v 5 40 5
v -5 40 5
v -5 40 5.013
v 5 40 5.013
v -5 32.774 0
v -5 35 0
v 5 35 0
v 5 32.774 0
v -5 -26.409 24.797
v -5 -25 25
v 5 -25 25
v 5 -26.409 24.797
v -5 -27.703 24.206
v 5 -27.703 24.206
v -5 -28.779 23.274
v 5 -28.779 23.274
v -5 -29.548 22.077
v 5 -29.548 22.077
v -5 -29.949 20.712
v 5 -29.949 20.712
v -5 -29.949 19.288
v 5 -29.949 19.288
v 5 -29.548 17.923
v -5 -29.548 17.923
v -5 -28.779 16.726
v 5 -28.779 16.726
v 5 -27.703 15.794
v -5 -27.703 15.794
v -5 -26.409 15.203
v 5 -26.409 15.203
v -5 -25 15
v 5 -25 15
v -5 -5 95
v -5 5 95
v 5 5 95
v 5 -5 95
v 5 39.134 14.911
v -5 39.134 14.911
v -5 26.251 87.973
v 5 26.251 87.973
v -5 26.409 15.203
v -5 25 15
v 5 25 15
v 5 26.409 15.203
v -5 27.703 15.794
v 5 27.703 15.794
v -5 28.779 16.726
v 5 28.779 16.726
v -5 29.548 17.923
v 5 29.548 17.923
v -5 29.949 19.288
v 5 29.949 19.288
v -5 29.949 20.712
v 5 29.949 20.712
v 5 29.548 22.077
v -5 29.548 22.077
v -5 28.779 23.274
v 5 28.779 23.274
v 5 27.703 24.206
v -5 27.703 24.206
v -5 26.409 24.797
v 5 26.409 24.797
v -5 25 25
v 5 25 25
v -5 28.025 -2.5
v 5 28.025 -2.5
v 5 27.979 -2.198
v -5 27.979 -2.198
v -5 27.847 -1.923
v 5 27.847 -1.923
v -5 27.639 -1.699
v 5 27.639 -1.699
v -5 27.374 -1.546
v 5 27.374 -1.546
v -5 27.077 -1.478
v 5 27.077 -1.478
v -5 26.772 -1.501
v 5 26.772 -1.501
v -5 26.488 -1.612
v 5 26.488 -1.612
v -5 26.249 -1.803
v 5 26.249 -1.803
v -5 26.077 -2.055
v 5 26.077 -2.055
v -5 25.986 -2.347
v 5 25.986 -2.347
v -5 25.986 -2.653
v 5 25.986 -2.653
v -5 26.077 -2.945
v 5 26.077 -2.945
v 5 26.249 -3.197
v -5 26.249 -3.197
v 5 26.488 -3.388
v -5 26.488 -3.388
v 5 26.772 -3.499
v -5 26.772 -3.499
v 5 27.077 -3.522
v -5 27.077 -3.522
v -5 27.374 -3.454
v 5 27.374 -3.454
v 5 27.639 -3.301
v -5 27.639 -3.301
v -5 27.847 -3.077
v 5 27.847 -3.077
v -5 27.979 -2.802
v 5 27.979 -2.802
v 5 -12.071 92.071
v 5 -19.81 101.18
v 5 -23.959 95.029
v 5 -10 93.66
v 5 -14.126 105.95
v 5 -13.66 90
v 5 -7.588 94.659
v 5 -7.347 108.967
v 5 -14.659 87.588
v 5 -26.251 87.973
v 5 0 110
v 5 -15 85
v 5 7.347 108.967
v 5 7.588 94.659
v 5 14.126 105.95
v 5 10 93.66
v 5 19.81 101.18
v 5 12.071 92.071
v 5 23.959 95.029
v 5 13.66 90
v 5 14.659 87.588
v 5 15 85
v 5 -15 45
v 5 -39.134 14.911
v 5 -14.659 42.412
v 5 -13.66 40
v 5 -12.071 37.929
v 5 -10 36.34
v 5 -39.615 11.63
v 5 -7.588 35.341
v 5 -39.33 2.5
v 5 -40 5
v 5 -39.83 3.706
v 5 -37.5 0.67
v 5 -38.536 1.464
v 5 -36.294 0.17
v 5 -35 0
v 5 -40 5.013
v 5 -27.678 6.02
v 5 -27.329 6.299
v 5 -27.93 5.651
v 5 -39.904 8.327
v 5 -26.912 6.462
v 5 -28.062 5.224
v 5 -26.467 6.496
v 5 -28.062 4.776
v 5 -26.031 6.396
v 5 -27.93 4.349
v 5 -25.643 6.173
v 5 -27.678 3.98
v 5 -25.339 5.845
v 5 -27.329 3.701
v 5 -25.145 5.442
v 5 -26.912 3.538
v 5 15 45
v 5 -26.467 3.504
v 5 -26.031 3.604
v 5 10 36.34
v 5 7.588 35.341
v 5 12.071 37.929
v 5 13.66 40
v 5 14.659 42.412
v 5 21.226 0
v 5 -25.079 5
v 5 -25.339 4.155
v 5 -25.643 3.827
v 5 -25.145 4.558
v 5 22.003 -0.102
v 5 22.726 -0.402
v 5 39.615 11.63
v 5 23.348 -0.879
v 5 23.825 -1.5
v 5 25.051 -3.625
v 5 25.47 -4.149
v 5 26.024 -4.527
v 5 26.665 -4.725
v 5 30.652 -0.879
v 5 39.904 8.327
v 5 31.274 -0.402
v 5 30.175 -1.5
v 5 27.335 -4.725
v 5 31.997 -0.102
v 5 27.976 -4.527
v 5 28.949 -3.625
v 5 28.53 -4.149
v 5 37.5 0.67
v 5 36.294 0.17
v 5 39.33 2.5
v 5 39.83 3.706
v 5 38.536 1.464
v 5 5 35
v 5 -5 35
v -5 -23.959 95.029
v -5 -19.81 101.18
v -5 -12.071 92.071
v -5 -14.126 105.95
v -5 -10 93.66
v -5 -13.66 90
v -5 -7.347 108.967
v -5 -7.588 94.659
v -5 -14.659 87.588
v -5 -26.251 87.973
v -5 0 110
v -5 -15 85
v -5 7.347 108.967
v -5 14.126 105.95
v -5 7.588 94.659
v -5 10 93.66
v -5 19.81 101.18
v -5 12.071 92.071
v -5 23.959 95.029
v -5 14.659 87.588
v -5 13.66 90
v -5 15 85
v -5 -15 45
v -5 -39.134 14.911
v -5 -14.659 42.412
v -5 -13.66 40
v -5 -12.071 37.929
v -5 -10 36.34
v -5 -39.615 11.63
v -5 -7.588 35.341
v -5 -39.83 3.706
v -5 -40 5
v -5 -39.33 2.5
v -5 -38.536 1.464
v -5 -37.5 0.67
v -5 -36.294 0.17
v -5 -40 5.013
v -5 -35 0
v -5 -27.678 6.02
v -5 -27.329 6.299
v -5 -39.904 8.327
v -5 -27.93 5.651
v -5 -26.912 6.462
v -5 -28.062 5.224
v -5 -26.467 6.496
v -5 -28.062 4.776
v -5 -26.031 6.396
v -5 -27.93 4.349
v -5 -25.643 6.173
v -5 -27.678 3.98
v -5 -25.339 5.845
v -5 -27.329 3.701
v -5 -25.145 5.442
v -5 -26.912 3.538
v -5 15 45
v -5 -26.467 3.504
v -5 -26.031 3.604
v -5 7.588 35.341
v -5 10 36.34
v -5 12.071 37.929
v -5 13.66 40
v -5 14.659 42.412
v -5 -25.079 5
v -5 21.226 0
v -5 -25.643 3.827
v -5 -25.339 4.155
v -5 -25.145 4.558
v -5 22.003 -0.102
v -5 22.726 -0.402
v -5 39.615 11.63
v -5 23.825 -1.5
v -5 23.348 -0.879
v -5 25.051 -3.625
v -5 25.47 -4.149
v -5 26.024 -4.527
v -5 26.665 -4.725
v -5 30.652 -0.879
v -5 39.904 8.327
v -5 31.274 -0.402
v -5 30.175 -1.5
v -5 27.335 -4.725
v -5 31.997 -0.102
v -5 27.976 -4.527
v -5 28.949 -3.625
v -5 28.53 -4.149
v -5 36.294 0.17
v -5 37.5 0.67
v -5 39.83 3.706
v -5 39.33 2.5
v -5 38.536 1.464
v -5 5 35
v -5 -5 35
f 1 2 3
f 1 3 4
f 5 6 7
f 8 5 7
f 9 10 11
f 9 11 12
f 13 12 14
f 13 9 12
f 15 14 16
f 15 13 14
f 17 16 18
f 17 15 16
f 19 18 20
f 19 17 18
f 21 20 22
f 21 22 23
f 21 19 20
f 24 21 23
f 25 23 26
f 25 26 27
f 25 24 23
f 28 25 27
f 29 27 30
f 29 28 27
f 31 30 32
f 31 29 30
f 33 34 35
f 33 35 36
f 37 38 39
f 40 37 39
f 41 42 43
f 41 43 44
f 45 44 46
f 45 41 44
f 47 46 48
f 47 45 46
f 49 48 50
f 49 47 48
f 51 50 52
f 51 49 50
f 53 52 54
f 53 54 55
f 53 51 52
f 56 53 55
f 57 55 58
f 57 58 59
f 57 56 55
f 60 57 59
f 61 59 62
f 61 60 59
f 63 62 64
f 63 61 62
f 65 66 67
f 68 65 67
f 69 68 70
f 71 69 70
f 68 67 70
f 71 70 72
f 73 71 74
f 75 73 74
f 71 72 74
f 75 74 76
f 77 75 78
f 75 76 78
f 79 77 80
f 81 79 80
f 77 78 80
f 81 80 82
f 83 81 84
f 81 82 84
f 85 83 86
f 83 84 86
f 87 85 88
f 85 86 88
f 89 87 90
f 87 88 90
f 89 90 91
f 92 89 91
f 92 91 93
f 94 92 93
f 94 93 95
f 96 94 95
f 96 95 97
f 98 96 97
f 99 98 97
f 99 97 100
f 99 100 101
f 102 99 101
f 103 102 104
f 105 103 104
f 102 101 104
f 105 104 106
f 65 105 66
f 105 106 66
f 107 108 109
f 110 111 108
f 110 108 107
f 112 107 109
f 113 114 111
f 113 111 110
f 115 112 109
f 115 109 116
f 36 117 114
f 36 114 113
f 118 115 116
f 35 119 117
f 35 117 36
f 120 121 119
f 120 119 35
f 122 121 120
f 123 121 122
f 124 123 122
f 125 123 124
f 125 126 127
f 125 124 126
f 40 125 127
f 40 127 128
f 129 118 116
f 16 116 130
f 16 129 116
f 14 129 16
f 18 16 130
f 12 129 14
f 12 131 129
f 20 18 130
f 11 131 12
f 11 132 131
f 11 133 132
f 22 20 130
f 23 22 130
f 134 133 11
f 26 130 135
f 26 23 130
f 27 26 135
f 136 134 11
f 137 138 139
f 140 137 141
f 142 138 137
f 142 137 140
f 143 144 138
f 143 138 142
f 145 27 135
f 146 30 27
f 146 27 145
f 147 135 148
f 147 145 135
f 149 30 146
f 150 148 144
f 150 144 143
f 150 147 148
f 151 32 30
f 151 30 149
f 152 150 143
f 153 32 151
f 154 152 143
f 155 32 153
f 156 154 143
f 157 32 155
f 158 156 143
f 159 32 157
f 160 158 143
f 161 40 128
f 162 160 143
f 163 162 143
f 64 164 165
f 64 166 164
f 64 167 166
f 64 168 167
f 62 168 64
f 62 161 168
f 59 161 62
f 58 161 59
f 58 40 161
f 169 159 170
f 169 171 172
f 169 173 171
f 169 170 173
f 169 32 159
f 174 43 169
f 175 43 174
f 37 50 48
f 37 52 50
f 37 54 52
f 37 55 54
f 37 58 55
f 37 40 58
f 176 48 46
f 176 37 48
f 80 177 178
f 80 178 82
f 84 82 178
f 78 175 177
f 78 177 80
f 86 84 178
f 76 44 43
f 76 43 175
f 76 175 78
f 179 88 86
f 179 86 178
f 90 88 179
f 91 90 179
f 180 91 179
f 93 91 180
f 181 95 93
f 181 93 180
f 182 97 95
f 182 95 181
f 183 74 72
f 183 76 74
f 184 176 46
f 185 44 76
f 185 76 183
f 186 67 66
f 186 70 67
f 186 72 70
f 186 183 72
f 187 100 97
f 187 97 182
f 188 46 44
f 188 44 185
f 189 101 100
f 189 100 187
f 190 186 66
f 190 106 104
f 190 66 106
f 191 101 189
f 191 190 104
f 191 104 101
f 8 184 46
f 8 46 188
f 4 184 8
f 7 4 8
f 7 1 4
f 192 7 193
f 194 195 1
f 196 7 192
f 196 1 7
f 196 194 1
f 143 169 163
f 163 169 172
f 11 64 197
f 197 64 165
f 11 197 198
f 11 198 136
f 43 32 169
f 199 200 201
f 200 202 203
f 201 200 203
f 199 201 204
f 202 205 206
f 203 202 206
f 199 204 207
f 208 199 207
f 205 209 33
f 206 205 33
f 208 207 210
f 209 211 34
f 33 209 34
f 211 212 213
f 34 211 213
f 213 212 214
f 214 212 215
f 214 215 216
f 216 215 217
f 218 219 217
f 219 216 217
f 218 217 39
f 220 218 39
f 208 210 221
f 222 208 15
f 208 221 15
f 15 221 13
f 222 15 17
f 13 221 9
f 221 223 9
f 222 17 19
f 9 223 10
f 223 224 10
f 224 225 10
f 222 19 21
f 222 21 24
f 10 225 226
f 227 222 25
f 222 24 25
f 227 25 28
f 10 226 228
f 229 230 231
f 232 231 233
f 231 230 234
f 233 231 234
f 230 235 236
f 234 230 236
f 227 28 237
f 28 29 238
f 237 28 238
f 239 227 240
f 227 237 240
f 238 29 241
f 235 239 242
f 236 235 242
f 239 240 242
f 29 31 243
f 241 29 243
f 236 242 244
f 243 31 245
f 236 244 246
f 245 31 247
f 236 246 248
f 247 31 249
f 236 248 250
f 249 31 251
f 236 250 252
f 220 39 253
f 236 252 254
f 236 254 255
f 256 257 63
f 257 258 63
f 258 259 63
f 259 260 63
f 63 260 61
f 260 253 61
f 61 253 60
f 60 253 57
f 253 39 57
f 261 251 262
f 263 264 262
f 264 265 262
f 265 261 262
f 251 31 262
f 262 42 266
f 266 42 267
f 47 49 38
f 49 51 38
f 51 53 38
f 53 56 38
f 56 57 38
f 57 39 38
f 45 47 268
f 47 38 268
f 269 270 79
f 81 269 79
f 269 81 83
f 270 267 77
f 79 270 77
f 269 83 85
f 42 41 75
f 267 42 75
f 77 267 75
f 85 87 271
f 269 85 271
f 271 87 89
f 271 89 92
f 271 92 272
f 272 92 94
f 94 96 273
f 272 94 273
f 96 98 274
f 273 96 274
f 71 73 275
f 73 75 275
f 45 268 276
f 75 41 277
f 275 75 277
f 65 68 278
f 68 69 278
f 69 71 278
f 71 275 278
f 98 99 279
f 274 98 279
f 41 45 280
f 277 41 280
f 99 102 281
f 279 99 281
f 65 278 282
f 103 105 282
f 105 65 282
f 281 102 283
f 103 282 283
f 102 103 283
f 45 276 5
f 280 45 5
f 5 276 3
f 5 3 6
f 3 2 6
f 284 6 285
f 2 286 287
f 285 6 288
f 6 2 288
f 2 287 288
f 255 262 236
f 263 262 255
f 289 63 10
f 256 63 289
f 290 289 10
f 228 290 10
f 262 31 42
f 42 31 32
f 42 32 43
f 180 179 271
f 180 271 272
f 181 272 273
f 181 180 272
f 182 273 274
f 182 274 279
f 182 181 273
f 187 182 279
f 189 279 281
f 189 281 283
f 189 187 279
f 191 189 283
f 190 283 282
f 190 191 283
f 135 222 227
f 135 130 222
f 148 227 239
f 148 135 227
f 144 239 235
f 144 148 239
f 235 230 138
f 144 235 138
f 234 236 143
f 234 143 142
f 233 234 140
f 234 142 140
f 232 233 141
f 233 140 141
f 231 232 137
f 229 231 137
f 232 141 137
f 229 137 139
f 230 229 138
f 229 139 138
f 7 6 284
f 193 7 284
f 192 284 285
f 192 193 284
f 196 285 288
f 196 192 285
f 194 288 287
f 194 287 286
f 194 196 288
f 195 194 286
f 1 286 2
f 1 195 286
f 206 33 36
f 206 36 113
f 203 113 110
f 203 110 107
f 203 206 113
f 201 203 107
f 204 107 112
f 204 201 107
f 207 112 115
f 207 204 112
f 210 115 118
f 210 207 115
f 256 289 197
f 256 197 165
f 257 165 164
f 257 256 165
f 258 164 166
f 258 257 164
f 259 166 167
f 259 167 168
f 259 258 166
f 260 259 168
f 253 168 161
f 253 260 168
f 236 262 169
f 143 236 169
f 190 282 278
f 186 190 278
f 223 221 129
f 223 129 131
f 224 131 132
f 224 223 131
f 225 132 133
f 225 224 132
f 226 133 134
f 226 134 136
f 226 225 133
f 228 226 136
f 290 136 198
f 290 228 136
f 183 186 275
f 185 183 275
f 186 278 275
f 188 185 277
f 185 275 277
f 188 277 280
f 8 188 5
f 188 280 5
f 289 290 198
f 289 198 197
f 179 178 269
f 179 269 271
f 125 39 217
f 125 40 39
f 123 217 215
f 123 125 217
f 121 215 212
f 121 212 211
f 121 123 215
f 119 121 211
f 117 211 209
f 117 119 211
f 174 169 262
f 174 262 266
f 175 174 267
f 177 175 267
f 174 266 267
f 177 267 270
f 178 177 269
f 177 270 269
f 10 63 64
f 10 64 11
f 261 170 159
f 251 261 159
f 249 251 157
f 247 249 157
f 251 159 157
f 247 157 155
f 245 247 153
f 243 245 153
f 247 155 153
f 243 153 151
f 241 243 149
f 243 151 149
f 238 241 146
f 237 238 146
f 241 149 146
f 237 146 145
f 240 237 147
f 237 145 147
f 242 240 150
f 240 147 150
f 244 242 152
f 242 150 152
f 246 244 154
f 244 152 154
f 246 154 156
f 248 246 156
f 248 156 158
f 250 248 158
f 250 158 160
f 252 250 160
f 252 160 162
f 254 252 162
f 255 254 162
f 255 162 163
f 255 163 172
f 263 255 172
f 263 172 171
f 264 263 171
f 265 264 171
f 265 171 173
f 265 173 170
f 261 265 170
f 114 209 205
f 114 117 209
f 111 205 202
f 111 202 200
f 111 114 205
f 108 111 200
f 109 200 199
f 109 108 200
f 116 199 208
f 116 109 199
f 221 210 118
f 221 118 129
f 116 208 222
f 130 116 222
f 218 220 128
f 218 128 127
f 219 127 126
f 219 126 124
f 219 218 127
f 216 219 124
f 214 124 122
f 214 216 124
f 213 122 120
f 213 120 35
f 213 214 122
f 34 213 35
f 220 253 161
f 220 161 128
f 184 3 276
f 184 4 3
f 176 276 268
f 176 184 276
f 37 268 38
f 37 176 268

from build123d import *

# Parameters (mm, degrees)
ESQUISSE1_W             = 10
ESQUISSE1_H             = 80
BOSS_EXTRU_1_DEPTH      = 10
BOSS_EXTRU_2_DEPTH      = 10
CONG_1_R                = 26.656312
ESQUISSE4_R             = 1.5
ENL_V_MAT_EXTRU_2_DEPTH = 118.473401245
ESQUISSE7_R             = 1.025
BOSS_EXTRU_3_DEPTH      = 10
CONG_2_R                = 3
CONG_3_R                = 3
CONG_4_R                = 5
CONG_5_R                = 57
CONG_6_R                = 57


with BuildPart() as part:
    # Esquisse1 → Boss.-Extru.1 (new body)
    with BuildSketch(Plane.XY):
        Rectangle(ESQUISSE1_W, ESQUISSE1_H)
    extrude(amount=BOSS_EXTRU_1_DEPTH)

    # Esquisse2 → Boss.-Extru.2 (add, through all)
    with BuildSketch(Plane.ZY.offset(5)):
        Polygon((10, 40), (110, 22.367301929), (110, -22.367301929), (10, -40), align=None)
        with BuildLine():
            Line((25, 25), (25, -25))
            ThreePointArc((25, -25), (20, -30), (15, -25))
            Line((15, -25), (15, 25))
            ThreePointArc((15, 25), (20, 30), (25, 25))
        make_face(mode=Mode.SUBTRACT)
        with BuildLine():
            Line((45, 15), (85, 15))
            ThreePointArc((85, 15), (92.071067812, 12.071067812), (95, 5))
            Line((95, 5), (95, -5))
            ThreePointArc((95, -5), (92.071067812, -12.071067812), (85, -15))
            Line((85, -15), (45, -15))
            ThreePointArc((45, -15), (37.928932188, -12.071067812), (35, -5))
            Line((35, -5), (35, 5))
            ThreePointArc((35, 5), (37.928932188, 12.071067812), (45, 15))
        make_face(mode=Mode.SUBTRACT)
    extrude(amount=-BOSS_EXTRU_2_DEPTH)

    # Congé1
    cong_1_edges = [part.edges().sort_by_distance(p)[0] for p in [
        (0, 22.367301929, 110),
        (0, -22.367301929, 110),
    ]]
    fillet(cong_1_edges, radius=CONG_1_R)

    # Esquisse4 → Enlèv. mat.-Extru.2 (cut, through all)
    with BuildSketch(Plane(origin=(5, 0, 0), x_dir=(0, 0, -1), z_dir=(1, 0, 0))):
        with Locations(Location((-5, -26.578661355, 0), (0, 0, 90))):
            Circle(ESQUISSE4_R)
    extrude(amount=-ENL_V_MAT_EXTRU_2_DEPTH, mode=Mode.SUBTRACT)

    # Esquisse7 → Boss.-Extru.3 (add, through all)
    with BuildSketch(Plane(origin=(5, 0, 0), x_dir=(0, 0, -1), z_dir=(1, 0, 0))):
        with BuildLine():
            Line((3.625, 28.948557159), (0, 31.041451884))
            Line((0, 31.041451884), (0, 22.958548116))
            Line((0, 22.958548116), (3.625, 25.051442841))
            ThreePointArc((3.625, 25.051442841), (4.75, 27), (3.625, 28.948557159))
        make_face()
        with Locations(Location((2.5, 27, 0), (0, 0, 90))):
            Circle(ESQUISSE7_R, mode=Mode.SUBTRACT)
    extrude(amount=-BOSS_EXTRU_3_DEPTH)

    # Congé2
    cong_2_edges = [part.edges().sort_by_distance(p)[0] for p in [
        (0, 22.958548116, 0),
    ]]
    fillet(cong_2_edges, radius=CONG_2_R)

    # Congé3
    cong_3_edges = [part.edges().sort_by_distance(p)[0] for p in [
        (0, 31.041451884, 0),
    ]]
    fillet(cong_3_edges, radius=CONG_3_R)

    # Congé4
    cong_4_edges = [part.edges().sort_by_distance(p)[0] for p in [
        (0, -40, 0),
        (0, 40, 0),
    ]]
    fillet(cong_4_edges, radius=CONG_4_R)

    # Congé5
    cong_5_edges = [part.edges().sort_by_distance(p)[0] for p in [
        (0, 40, 10),
    ]]
    fillet(cong_5_edges, radius=CONG_5_R)

    # Congé6
    cong_6_edges = [part.edges().sort_by_distance(p)[0] for p in [
        (0, -40, 10),
    ]]
    fillet(cong_6_edges, radius=CONG_6_R)


solid = part.part
